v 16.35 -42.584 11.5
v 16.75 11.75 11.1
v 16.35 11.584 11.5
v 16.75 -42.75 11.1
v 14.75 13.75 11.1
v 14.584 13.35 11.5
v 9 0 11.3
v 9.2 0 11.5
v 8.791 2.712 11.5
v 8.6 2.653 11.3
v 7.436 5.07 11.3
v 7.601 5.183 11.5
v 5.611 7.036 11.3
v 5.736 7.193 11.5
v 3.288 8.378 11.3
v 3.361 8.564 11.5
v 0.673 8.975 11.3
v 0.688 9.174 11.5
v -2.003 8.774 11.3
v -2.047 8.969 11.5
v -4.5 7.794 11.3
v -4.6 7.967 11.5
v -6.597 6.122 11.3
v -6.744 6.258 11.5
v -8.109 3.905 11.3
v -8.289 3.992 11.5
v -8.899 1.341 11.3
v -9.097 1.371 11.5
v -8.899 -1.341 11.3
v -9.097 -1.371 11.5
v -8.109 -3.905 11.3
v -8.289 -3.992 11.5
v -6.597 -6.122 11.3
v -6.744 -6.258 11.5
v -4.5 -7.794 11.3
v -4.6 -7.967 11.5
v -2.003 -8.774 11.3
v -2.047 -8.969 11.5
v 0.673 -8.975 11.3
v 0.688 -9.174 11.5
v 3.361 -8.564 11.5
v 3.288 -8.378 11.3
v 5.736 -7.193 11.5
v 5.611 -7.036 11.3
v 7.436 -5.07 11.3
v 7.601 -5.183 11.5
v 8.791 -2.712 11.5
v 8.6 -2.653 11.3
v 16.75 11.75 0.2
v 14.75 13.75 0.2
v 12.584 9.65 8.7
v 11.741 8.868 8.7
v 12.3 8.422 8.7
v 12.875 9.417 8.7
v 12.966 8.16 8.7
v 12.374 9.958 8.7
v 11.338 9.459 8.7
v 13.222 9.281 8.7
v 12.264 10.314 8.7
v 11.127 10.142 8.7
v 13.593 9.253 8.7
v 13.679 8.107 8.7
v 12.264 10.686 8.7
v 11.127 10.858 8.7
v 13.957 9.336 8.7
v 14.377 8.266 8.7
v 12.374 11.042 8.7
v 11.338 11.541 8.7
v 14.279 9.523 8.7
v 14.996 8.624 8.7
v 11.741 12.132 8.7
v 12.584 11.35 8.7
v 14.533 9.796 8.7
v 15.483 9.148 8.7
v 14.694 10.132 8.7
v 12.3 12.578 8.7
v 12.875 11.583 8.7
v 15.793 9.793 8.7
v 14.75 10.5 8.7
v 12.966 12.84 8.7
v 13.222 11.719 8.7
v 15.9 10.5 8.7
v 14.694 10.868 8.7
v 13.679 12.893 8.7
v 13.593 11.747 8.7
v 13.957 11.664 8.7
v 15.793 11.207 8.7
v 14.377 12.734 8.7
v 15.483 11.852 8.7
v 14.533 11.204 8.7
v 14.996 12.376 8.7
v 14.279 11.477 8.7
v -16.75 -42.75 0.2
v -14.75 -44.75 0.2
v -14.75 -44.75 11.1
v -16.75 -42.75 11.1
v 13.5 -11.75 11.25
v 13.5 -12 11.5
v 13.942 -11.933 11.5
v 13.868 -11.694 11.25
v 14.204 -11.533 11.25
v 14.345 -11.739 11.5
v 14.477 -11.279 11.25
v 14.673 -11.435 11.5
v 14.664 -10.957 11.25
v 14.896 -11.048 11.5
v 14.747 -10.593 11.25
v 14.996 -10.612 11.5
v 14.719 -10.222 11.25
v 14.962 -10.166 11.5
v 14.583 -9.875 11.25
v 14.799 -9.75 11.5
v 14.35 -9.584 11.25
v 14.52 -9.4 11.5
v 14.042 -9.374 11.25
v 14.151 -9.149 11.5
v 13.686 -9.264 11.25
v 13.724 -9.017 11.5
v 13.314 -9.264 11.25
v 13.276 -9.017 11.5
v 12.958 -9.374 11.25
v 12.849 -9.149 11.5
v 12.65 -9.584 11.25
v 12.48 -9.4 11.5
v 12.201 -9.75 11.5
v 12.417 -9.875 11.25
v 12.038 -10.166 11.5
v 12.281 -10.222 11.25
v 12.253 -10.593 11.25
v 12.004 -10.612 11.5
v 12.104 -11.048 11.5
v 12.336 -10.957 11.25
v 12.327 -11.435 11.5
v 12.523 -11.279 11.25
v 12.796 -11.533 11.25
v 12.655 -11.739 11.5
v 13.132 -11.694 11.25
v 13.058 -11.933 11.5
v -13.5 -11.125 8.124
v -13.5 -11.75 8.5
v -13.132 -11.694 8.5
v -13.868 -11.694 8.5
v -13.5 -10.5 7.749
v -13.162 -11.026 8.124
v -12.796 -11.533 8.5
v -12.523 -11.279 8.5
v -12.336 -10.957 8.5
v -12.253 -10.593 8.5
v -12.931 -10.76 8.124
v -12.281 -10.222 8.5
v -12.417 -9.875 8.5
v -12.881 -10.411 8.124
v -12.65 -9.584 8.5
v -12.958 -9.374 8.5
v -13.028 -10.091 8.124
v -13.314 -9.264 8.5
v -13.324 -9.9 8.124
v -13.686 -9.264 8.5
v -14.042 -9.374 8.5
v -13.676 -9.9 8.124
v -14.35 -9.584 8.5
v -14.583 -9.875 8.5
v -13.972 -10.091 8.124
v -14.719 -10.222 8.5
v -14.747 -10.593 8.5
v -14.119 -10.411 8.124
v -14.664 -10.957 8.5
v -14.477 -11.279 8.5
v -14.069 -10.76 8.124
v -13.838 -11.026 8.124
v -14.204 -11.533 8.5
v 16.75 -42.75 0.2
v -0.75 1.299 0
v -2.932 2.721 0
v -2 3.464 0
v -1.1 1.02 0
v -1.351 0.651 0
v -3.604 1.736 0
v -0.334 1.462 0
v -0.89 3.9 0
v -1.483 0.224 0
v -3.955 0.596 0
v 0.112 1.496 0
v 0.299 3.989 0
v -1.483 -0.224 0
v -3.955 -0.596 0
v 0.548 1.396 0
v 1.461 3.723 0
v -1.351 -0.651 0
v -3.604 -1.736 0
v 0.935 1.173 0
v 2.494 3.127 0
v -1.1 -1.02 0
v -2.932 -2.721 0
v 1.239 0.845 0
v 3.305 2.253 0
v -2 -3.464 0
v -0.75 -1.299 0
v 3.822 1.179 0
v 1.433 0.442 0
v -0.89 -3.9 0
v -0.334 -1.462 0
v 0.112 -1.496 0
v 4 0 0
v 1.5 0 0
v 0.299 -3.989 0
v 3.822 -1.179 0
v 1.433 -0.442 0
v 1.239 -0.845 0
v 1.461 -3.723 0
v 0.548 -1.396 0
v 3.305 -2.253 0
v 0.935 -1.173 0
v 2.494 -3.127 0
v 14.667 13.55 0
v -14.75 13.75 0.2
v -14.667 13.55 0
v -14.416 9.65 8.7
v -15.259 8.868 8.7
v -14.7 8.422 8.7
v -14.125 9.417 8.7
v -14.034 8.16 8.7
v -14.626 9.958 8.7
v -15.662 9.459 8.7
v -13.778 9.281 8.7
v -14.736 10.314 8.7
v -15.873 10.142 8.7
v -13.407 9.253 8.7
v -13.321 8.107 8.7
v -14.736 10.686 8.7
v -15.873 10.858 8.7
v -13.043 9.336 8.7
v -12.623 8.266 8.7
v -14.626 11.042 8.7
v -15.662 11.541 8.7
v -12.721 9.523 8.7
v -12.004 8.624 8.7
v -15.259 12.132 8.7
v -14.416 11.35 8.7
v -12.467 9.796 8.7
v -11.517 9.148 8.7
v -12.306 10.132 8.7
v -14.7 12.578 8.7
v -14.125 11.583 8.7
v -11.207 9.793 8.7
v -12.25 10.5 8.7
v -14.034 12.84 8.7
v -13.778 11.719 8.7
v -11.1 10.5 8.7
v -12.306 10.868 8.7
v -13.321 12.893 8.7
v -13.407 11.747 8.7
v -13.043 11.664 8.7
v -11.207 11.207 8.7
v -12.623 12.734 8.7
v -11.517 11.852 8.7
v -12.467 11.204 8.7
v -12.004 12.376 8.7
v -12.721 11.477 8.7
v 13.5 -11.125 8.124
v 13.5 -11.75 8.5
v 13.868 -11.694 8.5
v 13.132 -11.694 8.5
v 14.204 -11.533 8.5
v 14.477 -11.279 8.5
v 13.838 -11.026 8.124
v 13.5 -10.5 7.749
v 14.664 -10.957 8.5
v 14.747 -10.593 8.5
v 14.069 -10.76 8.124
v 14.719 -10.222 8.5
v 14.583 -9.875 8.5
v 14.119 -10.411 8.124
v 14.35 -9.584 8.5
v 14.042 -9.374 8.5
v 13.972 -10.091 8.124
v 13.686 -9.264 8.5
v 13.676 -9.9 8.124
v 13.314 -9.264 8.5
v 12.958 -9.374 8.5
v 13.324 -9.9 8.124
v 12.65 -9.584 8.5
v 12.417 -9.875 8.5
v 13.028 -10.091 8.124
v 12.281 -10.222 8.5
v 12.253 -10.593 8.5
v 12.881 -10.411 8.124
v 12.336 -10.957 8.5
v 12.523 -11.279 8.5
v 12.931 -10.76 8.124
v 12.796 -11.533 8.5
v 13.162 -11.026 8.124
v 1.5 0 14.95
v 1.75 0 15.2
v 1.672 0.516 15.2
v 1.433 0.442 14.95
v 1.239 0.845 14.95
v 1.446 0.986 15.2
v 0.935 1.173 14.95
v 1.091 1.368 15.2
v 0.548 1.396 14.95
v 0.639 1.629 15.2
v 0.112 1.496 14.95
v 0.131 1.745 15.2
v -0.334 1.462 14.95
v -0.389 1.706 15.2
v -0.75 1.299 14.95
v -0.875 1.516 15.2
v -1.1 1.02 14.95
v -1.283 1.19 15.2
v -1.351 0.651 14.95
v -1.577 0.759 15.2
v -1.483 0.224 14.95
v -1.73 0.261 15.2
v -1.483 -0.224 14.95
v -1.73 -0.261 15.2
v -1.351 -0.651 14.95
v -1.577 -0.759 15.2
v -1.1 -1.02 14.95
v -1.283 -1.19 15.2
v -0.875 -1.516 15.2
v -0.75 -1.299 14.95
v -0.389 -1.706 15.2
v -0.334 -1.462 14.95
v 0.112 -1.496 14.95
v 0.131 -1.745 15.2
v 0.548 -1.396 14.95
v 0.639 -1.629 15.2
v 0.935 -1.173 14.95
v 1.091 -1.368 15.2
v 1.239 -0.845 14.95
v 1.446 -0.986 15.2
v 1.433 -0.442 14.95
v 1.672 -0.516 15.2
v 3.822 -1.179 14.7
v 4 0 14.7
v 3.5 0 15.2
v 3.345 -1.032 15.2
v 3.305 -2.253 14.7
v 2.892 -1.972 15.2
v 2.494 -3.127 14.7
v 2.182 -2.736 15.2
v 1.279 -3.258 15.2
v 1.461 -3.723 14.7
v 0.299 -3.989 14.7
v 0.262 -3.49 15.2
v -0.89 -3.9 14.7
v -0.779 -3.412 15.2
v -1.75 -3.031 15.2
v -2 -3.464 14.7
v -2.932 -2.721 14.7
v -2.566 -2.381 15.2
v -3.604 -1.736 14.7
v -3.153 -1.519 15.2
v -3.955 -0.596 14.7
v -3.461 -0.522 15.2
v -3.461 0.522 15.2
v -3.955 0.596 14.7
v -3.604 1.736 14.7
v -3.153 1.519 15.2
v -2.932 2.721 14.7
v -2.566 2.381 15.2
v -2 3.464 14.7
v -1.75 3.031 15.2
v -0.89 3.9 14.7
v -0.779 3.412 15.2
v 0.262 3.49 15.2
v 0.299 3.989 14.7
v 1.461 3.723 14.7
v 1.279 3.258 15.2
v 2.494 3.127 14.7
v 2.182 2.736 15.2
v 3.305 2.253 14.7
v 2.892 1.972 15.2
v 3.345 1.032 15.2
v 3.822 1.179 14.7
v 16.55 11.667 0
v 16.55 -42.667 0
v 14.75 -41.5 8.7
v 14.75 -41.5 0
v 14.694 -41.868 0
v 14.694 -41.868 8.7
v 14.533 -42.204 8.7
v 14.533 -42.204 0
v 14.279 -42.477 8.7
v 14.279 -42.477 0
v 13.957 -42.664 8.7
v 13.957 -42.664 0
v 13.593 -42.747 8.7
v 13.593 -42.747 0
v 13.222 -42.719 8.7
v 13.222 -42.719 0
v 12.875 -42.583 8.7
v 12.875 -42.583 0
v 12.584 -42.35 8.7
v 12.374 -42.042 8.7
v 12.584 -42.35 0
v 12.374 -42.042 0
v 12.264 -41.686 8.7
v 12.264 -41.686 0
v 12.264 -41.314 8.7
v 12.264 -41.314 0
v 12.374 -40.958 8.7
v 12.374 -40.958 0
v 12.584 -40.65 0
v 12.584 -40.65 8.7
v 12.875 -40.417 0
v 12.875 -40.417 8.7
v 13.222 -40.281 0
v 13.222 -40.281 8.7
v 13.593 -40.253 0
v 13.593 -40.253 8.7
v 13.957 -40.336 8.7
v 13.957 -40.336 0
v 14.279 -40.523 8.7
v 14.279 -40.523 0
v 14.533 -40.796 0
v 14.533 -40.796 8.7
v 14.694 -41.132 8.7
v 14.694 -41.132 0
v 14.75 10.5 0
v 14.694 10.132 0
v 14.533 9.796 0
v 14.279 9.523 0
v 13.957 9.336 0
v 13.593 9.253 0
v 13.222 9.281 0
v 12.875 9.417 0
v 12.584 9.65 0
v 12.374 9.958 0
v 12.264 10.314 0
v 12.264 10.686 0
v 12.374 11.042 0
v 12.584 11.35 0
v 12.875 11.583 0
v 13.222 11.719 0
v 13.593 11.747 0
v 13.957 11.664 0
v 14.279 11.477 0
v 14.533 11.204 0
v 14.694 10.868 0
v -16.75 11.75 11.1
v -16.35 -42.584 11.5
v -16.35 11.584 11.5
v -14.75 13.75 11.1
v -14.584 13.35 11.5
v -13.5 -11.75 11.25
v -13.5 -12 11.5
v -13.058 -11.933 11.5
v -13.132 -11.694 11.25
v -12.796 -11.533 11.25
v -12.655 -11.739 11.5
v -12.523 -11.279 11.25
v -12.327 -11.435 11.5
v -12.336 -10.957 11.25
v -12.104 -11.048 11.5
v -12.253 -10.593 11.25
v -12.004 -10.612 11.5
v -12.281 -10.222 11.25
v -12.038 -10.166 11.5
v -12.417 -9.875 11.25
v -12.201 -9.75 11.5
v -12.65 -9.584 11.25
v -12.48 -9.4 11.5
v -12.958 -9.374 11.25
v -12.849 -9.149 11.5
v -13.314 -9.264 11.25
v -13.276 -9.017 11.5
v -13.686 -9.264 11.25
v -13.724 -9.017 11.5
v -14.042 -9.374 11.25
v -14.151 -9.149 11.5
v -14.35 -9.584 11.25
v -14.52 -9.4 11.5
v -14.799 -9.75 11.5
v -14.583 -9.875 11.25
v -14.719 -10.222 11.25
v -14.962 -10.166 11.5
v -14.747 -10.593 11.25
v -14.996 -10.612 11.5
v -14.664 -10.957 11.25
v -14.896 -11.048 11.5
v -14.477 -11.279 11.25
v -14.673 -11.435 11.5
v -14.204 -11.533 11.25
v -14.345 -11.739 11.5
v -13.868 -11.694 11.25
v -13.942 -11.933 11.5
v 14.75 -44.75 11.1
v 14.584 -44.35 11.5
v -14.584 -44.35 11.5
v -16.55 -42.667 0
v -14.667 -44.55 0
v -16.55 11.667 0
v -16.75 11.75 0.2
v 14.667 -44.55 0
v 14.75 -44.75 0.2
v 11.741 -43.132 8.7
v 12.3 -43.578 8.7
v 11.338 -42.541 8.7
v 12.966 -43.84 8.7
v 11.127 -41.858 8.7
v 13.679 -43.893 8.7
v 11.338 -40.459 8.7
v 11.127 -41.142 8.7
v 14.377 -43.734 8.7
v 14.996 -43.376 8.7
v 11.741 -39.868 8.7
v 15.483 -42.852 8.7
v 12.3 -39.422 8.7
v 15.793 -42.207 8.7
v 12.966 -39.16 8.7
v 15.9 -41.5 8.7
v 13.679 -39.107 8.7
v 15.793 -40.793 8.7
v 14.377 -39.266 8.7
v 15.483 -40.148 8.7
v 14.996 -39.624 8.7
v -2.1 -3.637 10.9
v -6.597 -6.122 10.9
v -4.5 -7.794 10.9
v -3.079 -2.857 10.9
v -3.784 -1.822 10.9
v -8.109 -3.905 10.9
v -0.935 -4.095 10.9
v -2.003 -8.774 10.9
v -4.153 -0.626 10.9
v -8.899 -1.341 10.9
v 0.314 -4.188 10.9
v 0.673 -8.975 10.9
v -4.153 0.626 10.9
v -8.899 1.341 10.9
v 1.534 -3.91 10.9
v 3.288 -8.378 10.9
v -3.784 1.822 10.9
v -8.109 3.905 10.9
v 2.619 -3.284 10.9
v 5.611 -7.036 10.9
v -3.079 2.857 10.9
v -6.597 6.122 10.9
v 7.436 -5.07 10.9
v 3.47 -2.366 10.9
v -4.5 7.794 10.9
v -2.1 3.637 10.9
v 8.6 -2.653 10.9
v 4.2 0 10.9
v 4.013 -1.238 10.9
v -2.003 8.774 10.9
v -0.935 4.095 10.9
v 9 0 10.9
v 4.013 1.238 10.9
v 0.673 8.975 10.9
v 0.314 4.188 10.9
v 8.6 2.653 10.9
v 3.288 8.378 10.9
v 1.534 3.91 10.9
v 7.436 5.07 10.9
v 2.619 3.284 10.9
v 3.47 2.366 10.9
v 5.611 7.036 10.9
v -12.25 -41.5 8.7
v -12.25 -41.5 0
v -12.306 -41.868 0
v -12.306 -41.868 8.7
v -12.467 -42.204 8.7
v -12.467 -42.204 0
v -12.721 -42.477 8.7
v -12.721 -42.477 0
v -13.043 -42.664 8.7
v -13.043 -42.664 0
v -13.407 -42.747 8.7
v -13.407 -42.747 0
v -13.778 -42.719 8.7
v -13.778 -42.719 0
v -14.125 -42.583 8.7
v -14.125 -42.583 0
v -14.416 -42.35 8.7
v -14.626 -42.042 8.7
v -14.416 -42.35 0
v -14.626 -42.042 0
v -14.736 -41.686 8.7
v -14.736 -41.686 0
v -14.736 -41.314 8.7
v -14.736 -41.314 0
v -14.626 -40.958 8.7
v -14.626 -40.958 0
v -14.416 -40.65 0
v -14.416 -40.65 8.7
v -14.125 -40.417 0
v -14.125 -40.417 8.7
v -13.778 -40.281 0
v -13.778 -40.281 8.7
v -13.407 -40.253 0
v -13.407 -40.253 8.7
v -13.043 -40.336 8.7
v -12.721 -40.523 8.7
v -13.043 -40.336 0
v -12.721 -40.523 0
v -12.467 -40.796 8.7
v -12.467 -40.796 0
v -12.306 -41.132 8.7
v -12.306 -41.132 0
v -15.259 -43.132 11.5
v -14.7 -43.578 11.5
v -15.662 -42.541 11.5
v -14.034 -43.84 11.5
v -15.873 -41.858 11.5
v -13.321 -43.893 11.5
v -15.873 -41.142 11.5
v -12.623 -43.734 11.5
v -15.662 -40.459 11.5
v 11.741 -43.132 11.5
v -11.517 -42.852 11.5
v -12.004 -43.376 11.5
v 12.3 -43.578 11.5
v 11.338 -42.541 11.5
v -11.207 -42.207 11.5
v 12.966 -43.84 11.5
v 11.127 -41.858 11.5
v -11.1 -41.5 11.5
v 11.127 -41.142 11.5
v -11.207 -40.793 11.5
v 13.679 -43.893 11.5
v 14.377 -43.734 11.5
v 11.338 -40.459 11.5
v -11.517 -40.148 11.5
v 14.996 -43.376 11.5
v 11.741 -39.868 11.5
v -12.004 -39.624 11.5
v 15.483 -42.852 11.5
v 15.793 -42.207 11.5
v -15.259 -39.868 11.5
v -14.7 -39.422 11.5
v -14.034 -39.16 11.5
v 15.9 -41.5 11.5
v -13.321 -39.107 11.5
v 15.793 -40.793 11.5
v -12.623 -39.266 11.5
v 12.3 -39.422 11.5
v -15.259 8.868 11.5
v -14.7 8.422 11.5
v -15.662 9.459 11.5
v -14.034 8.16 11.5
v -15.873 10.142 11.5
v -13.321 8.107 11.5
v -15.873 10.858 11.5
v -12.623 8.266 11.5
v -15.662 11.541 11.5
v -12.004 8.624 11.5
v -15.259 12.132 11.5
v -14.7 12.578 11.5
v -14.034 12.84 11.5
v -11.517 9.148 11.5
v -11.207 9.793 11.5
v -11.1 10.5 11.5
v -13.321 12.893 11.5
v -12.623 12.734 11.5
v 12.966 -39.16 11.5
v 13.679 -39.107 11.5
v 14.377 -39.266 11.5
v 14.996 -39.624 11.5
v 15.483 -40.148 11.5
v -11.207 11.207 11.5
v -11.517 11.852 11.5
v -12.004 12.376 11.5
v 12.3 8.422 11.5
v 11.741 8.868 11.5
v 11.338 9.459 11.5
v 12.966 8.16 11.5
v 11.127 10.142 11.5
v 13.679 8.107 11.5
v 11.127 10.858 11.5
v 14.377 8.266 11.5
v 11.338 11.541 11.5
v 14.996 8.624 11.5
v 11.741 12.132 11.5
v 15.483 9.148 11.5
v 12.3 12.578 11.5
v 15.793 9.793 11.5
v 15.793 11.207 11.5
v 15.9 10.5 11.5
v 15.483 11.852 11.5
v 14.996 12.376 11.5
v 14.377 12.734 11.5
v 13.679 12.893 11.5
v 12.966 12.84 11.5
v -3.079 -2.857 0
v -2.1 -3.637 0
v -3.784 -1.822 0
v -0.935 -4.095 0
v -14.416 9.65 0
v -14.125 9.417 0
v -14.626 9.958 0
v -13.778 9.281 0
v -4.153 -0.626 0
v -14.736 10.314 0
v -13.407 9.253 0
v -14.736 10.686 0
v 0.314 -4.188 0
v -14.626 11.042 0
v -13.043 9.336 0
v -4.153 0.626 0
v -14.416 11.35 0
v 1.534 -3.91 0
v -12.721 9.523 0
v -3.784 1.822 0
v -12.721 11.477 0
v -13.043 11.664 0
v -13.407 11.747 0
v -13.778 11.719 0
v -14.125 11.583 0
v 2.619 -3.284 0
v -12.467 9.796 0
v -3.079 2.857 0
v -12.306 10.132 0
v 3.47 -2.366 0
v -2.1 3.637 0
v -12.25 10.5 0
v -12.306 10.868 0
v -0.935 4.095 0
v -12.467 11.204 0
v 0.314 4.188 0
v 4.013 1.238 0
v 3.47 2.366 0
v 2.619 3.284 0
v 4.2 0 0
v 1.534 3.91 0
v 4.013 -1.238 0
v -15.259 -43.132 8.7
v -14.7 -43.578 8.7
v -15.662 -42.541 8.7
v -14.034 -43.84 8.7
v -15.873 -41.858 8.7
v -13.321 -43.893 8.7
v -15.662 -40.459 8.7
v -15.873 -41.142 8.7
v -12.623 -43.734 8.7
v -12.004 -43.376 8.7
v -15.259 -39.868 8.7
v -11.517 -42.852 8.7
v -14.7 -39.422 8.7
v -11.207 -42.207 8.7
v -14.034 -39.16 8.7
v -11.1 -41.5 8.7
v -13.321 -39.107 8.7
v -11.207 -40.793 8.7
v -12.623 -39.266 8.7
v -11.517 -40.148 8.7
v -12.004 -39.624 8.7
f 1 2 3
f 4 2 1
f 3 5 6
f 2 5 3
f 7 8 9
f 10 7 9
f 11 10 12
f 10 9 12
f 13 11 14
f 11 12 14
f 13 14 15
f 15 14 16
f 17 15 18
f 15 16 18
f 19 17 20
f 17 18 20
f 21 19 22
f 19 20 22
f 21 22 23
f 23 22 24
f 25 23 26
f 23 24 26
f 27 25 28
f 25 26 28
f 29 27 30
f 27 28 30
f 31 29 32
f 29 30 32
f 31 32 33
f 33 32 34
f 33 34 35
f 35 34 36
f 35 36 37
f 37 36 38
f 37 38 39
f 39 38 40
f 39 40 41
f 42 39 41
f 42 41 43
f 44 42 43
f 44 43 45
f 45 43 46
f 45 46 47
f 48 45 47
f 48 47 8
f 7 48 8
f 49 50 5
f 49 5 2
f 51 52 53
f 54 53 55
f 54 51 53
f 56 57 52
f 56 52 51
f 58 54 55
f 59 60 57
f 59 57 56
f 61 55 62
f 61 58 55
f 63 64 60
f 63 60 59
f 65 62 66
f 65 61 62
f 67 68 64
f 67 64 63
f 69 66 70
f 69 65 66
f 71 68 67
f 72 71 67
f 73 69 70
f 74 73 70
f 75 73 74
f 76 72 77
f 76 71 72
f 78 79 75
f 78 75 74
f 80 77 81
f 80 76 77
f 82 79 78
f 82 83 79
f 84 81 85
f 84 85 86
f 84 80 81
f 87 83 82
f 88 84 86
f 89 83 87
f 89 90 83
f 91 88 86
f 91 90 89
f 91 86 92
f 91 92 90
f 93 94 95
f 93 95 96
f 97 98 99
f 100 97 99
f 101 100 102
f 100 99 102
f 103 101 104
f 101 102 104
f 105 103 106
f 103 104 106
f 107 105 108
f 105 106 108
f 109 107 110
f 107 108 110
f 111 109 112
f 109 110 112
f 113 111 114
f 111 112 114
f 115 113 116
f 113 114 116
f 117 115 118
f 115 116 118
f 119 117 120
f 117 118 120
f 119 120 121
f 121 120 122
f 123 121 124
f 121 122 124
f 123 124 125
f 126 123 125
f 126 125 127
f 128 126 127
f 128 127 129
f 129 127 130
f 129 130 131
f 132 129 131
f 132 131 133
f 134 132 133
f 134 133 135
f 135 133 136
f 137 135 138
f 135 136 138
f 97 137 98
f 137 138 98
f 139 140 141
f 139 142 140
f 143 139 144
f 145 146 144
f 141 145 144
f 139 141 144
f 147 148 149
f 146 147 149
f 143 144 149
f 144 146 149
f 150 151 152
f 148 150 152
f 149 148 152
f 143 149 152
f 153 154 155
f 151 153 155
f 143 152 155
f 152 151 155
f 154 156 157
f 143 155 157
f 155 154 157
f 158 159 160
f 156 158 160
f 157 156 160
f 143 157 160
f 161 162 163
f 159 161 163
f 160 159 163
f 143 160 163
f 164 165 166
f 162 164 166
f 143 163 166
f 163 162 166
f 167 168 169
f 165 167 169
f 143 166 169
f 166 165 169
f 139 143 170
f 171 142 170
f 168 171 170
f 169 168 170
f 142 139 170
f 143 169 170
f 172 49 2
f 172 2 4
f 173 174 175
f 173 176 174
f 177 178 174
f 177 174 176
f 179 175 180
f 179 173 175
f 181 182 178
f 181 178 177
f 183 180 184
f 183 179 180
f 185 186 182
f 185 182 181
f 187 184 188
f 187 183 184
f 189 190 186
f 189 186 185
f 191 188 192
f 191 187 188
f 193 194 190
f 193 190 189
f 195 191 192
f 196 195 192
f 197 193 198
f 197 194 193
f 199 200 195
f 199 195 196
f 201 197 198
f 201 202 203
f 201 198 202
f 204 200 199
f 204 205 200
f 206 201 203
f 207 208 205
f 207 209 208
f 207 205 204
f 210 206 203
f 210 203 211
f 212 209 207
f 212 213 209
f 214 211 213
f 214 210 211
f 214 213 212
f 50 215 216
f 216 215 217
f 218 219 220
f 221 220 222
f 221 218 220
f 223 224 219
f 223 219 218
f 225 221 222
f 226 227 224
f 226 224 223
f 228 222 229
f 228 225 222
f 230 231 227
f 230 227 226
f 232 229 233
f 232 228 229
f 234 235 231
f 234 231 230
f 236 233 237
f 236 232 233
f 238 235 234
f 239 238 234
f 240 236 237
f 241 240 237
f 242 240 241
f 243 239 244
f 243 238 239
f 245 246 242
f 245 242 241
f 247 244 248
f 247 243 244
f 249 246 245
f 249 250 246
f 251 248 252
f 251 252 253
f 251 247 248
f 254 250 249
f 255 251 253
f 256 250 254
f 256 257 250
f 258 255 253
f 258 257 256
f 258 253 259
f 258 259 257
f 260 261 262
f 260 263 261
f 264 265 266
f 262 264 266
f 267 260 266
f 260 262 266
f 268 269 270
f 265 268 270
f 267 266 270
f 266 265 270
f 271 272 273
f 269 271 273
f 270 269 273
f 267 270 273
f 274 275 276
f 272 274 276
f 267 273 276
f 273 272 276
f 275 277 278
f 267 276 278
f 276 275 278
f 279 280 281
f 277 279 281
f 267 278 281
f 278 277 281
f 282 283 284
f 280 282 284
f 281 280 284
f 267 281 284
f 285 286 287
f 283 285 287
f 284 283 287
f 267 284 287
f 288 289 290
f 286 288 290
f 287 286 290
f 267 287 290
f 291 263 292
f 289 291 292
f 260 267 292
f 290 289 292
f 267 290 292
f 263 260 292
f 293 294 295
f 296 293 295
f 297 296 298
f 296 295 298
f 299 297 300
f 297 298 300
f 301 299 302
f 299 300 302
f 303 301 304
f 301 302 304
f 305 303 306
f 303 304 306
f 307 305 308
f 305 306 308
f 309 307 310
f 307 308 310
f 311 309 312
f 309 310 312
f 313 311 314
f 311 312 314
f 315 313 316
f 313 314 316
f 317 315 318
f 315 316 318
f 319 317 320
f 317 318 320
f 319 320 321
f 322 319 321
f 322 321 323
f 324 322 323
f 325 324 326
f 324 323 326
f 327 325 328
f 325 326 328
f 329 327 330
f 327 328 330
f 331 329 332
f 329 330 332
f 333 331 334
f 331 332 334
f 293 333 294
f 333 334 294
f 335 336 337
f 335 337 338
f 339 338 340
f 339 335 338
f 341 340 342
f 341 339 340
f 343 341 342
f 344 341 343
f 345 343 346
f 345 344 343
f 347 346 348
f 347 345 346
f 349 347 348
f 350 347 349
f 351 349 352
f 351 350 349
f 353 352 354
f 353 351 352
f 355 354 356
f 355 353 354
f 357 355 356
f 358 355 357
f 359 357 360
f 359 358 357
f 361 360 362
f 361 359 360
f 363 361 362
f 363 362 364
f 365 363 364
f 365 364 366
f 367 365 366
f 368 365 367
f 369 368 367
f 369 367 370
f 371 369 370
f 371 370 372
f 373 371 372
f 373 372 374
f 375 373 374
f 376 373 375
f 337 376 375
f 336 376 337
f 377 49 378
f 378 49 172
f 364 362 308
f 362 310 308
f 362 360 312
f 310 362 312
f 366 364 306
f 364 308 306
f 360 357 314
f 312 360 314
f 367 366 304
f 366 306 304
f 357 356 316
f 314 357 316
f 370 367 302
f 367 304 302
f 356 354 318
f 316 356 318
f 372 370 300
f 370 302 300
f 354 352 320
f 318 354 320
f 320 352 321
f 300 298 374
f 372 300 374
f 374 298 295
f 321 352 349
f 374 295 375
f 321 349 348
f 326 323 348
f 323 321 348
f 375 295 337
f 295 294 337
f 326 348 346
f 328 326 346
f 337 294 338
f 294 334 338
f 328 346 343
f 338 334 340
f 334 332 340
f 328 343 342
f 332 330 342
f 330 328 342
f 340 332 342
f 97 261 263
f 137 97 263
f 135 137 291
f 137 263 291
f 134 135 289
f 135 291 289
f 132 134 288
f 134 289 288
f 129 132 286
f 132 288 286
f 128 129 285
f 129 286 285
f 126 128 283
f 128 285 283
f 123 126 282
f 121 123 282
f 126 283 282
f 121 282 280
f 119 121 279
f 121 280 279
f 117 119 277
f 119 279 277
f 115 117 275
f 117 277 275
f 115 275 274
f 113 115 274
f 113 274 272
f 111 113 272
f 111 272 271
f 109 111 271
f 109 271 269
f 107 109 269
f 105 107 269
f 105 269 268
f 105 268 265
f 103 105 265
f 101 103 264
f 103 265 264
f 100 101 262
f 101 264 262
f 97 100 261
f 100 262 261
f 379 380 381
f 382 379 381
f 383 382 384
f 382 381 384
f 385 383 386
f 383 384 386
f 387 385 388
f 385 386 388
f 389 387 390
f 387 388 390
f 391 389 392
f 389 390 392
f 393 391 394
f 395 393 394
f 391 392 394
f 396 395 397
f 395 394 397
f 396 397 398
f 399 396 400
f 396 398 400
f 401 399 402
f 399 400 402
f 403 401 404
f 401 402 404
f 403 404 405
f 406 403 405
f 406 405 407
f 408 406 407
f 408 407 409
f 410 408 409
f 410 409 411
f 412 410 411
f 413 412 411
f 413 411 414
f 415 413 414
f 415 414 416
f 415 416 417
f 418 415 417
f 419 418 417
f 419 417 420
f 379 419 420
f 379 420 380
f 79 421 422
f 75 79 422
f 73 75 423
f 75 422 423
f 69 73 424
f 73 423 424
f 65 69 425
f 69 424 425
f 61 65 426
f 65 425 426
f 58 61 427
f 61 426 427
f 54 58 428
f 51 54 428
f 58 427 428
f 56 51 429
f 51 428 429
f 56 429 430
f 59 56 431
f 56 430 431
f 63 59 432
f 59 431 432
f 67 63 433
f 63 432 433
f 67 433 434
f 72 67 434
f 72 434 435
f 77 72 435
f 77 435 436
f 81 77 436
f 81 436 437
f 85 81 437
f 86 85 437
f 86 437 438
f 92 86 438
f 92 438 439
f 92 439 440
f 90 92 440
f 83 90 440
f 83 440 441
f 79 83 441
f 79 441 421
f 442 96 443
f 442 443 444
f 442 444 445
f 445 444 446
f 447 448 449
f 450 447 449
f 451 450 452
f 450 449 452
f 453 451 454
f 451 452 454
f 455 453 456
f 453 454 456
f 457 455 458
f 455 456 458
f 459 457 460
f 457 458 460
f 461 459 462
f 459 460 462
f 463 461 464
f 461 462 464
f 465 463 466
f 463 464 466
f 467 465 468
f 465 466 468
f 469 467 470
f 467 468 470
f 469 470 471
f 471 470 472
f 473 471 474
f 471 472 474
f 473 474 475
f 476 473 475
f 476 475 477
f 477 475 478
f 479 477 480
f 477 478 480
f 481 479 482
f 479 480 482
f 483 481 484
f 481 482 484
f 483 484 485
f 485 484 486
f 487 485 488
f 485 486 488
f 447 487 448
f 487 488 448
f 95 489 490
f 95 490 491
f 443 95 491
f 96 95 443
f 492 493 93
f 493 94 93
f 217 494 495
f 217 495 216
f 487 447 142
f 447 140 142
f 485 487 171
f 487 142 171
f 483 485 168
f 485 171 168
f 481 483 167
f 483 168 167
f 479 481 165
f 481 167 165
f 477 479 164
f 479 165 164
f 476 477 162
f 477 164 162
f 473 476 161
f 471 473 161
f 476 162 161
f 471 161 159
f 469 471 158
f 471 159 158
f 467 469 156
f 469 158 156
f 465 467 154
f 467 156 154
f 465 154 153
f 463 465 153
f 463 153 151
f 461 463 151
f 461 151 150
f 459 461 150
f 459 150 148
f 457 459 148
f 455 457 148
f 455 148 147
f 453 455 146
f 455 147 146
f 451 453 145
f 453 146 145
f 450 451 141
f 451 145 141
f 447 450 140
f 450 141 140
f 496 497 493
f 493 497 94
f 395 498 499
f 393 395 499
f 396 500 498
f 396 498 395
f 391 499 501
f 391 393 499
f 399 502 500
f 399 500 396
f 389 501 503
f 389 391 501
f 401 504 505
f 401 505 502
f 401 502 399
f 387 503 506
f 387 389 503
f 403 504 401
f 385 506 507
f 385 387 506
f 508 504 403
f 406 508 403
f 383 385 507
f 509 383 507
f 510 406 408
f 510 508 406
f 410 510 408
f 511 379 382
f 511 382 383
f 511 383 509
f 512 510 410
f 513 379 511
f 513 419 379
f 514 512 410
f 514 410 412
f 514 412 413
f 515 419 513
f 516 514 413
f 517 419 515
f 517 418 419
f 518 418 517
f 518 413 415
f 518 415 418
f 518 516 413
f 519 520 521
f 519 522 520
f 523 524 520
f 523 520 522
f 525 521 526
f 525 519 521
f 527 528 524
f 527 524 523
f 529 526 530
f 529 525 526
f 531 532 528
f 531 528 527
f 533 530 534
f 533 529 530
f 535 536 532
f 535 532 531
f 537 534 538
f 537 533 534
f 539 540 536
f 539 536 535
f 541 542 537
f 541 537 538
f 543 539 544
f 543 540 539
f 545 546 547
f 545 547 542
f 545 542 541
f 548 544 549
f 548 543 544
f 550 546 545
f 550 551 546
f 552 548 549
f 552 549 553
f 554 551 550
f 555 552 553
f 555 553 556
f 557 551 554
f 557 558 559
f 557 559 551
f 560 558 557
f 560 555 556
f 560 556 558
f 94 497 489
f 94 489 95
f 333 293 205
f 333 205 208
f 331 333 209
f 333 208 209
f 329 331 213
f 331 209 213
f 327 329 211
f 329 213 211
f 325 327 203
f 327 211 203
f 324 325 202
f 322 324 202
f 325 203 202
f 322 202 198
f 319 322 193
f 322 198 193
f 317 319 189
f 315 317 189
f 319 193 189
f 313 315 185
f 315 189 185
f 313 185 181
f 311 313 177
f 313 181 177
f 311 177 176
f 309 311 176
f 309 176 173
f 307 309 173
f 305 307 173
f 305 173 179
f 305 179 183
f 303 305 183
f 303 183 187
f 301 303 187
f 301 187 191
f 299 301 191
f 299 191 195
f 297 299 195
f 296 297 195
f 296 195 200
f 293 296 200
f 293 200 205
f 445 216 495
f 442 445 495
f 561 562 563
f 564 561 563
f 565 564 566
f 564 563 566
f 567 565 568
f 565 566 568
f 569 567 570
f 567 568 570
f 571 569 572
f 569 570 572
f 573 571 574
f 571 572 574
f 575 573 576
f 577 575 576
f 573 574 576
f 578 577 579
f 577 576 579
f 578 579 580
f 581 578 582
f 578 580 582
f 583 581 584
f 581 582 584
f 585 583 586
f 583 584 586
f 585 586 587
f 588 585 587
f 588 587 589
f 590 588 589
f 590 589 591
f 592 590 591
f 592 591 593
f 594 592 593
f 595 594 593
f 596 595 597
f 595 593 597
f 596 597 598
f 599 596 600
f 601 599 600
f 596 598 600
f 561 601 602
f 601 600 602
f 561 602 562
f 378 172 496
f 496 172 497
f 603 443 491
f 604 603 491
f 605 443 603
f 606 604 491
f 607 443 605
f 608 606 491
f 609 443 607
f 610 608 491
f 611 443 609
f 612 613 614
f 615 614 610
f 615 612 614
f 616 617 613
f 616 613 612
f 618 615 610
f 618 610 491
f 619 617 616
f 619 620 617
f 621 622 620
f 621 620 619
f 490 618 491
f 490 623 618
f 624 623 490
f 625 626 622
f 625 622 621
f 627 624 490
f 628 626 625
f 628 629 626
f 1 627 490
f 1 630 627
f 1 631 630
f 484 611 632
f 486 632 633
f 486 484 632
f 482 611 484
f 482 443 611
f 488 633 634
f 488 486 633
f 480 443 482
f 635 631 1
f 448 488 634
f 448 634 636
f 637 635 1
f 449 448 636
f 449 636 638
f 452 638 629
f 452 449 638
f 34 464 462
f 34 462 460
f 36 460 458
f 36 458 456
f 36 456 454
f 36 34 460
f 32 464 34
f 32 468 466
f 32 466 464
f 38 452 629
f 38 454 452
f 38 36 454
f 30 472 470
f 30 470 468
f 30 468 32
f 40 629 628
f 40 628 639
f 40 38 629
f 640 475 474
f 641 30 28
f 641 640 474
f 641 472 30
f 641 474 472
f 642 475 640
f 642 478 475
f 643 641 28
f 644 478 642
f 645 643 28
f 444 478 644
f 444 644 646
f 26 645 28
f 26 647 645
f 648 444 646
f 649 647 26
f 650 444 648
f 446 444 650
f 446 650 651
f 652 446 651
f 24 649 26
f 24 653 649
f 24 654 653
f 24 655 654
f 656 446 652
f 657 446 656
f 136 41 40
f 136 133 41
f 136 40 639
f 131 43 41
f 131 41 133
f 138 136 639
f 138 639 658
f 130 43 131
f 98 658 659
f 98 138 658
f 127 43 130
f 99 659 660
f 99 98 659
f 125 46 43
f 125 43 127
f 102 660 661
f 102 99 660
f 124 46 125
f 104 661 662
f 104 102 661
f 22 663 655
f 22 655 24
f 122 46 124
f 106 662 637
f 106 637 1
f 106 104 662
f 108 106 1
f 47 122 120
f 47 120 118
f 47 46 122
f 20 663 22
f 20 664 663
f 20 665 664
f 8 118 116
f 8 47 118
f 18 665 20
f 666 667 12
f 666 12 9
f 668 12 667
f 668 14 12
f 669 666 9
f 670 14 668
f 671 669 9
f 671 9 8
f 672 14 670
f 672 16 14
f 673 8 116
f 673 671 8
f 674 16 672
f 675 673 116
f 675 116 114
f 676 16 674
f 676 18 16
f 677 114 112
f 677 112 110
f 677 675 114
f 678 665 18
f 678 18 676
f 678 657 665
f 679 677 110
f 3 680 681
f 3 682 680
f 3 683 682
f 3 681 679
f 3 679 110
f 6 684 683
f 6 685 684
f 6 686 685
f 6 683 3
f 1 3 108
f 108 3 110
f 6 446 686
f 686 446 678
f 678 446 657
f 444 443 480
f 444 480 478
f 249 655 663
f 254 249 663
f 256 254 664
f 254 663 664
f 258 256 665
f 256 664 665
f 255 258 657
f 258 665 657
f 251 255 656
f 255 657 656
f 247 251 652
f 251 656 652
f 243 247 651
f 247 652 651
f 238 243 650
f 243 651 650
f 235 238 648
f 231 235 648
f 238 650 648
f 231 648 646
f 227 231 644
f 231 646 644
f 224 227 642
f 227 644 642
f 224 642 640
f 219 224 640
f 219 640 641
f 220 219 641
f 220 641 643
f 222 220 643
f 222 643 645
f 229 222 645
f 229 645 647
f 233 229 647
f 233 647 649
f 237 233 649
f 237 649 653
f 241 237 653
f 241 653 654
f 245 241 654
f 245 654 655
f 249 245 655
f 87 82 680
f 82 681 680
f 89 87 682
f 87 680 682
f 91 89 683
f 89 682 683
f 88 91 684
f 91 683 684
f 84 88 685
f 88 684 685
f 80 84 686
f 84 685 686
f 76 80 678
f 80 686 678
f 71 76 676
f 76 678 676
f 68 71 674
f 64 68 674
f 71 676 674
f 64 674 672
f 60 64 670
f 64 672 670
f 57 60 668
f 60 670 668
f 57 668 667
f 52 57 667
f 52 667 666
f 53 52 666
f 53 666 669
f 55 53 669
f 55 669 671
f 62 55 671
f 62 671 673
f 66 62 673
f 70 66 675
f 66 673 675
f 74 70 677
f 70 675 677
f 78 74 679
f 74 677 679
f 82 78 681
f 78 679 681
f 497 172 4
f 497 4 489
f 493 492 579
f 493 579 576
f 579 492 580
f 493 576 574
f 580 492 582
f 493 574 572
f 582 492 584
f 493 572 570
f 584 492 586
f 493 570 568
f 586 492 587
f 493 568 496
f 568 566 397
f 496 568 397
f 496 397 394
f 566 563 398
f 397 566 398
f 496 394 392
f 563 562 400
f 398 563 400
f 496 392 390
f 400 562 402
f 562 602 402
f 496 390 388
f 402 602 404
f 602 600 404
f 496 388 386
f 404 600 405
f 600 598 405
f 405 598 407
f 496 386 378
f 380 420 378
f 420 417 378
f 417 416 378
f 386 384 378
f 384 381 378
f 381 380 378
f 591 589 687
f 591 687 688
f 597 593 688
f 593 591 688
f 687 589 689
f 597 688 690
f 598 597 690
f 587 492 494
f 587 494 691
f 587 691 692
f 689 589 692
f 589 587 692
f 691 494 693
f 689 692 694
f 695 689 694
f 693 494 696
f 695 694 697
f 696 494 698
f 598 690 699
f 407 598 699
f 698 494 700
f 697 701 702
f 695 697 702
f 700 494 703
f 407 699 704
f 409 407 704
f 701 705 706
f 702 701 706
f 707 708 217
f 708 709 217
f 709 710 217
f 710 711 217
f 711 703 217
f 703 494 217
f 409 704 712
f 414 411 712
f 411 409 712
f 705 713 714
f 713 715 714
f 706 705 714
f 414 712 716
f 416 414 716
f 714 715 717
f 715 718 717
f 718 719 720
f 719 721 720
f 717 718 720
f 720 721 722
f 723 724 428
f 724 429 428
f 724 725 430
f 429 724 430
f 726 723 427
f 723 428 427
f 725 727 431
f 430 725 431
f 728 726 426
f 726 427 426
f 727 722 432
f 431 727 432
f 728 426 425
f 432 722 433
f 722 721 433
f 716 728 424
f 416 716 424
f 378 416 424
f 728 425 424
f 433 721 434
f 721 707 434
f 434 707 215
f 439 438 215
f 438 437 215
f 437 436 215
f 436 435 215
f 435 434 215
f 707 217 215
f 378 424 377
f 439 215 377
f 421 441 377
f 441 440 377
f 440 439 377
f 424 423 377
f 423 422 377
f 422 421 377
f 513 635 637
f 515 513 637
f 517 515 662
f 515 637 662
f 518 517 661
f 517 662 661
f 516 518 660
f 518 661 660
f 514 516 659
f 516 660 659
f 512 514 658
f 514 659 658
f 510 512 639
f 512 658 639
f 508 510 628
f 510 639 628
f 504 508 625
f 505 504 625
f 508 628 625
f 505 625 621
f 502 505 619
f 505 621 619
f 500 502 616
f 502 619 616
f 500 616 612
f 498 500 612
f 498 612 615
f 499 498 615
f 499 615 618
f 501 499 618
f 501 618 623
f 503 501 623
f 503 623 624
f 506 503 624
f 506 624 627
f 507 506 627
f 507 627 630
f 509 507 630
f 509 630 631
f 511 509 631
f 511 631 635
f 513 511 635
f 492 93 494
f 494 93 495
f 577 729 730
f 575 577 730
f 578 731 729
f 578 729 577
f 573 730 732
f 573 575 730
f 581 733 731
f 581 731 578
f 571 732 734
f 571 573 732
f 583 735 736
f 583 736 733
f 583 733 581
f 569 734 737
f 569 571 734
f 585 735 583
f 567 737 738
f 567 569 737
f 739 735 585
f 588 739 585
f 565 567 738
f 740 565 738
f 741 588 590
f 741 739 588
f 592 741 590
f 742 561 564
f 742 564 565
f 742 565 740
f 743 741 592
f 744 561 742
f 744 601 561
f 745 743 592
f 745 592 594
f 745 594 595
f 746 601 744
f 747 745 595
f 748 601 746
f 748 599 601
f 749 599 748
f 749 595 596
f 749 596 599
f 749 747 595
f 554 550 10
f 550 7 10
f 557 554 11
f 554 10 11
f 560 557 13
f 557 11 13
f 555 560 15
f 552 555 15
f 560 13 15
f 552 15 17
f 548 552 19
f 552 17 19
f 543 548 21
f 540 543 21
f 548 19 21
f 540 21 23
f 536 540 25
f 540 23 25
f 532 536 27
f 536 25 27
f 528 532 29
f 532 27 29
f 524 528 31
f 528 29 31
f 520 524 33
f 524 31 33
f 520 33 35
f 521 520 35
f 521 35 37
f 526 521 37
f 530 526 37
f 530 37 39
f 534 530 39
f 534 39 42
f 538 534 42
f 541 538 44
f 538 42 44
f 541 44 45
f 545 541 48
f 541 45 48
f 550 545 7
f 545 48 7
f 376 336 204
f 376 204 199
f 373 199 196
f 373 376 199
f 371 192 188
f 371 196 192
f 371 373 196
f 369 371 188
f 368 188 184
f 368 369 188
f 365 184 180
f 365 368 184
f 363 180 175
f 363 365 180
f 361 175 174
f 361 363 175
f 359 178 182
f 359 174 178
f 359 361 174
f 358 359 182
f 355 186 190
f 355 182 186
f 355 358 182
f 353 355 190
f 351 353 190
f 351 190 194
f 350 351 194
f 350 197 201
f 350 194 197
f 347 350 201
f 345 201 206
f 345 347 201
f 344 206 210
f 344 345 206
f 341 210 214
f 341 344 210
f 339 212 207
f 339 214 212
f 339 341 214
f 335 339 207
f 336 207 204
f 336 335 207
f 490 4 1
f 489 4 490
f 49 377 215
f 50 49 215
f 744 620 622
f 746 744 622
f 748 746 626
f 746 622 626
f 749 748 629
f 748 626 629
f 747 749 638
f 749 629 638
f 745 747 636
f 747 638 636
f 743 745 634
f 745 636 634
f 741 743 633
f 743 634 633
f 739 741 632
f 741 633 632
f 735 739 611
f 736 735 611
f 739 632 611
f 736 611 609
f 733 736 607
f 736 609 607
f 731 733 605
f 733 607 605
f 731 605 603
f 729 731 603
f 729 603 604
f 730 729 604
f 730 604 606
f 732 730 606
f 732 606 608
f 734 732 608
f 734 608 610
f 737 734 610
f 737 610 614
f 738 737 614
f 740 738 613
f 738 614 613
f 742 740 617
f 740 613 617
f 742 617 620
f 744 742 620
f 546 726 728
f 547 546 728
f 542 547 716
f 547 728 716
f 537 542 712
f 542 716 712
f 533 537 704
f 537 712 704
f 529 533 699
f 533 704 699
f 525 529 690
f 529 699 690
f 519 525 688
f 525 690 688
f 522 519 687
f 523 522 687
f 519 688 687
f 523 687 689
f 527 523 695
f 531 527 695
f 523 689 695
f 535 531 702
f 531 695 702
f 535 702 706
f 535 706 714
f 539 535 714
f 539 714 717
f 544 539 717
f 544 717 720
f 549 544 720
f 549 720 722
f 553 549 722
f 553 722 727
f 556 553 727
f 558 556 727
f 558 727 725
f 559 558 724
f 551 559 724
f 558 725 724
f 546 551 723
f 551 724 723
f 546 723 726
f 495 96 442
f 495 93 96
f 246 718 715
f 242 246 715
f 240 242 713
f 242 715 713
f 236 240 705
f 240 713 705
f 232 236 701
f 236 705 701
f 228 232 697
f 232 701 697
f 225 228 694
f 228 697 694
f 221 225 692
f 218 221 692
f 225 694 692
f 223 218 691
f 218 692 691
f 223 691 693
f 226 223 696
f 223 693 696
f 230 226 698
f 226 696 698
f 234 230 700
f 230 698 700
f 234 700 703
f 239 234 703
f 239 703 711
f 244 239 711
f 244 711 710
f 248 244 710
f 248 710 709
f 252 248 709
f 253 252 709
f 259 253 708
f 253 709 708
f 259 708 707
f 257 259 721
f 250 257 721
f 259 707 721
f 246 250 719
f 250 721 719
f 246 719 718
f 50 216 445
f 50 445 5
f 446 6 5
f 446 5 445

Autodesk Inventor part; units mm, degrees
ref_plane "YZ Plane" through (0, 0, 0) normal (1, 0, 0) x (0, 1, 0)
ref_plane "XZ Plane" through (0, 0, 0) normal (0, 1, 0) x (-1, 0, 0)
ref_plane "XY Plane" through (0, 0, 0) normal (0, 0, 1) x (1, 0, 0)
sketch "スケッチ1" plane through (0, 0, 0) normal (0, 0, 1) x (1, 0, 0)
  line L0 (-14.75, 13.75) -> (14.75, 13.75)
  line L1 (16.75, 11.75) -> (16.75, -42.75)
  line L2 (14.75, -44.75) -> (-14.75, -44.75)
  line L3 (-16.75, -42.75) -> (-16.75, 11.75)
  line L4 (-14.75, 13.75) -> (-16.75, 11.75)
  line L5 (14.75, 13.75) -> (16.75, 11.75)
  line L6 (16.75, -42.75) -> (14.75, -44.75)
  line L7 (-14.75, -44.75) -> (-16.75, -42.75)
  line L8 (0, 0) -> (0, -49.9081) construction
  circle A0 centre (0, 0) radius 13 construction
  line L9 (-13.5, 10.5) -> (13.5, 10.5) construction
  line L10 (13.5, 10.5) -> (13.5, -41.5) construction
  line L11 (13.5, -41.5) -> (-13.5, -41.5) construction
  line L12 (-13.5, -41.5) -> (-13.5, 10.5) construction
  circle A1 centre (-13.5, 10.5) radius 1.25
  circle A2 centre (13.5, 10.5) radius 1.25
  circle A3 centre (13.5, -41.5) radius 1.25
  circle A4 centre (-13.5, -41.5) radius 1.25
  circle A5 centre (0, 0) radius 4.2
  point P0 (-16.75, 13.75)
  point P1 (16.75, -44.75)
  point P2 (16.75, 13.75)
  point P3 (-16.75, -44.75)
  dimension "d0" = 2
  dimension "d1" = 2
  dimension "d2" = 2
  dimension "d3" = 2
  dimension "d4" = 2
  dimension "d5" = 2
  dimension "d6" = 2
  dimension "d7" = 2
  dimension "d8" = 33.5
  dimension "d9" = 26
  dimension "d10" = 13.75
  dimension "d11" = 58.5
  dimension "d24" = 27
  dimension "d25" = 10.5
  dimension "d26" = 52
  dimension "d27" = 2.5
  dimension "d31" = 8.4
extrude "押し出し1" add sketch "スケッチ1" along normal blind 11.5
sketch "スケッチ6" plane through (0, 0, 11.5) normal (0, 0, 1) x (1, 0, 0)
  line L0 (0, 0) -> (-21.0529, 0) construction
  line L1 (0, 0) -> (0, -16.0256) construction
  circle A0 centre (-13.5, 10.5) radius 1.25 construction
  line L2 (-13.5, 10.5) -> (-13.5, -10.5) construction
  point P0 (13.5, -10.5)
  dimension "d48" = 21
hole "穴1" at (13.5, -10.5, 11.5) at (-13.5, -10.5, 11.5) direction (0, 0, -1) diameter 2.5 depth 3 tip angle 118 countersink diameter 3 countersink angle 90
sketch "スケッチ2" plane through (0, 0, 11.5) normal (0, 0, 1) x (1, 0, 0)
  line L0 (-13.5, 10.5) -> (13.5, 10.5) construction
  line L1 (13.5, 10.5) -> (13.5, -41.5) construction
  line L2 (13.5, -41.5) -> (-13.5, -41.5) construction
  line L3 (-13.5, -41.5) -> (-13.5, 10.5) construction
  line L4 (0, 0) -> (0, 31.2445) construction
  circle A0 centre (13.5, 10.5) radius 2.4
  circle A1 centre (13.5, -41.5) radius 2.4
  circle A2 centre (-13.5, -41.5) radius 2.4
  circle A3 centre (-13.5, 10.5) radius 2.4
  dimension "d18" = 27
  dimension "d19" = 10.5
  dimension "d20" = 52
  dimension "d21" = 4.8
extrude "押し出し2" cut sketch "スケッチ2" against normal blind 2.8
sketch "スケッチ3" plane through (0, 0, 11.5) normal (0, 0, 1) x (1, 0, 0)
  circle A0 centre (0, 0) radius 9
  dimension "d28" = 18
extrude "押し出し3" cut sketch "スケッチ3" against normal blind 0.6
chamfer "面取り1" distance 0.2 angle 45 9 edges at (-9, 0, 11.5) (-15.75, -43.75, 0) (-16.75, -15.5, 0) (0, -44.75, 0) (15.75, -43.75, 0) (16.75, -15.5, 0) (15.75, 12.75, 0) (0, 13.75, 0) (-15.75, 12.75, 0)
chamfer "面取り2" distance 0.4 angle 45 8 edges at (-16.75, -15.5, 11.5) (-15.75, 12.75, 11.5) (0, 13.75, 11.5) (15.75, 12.75, 11.5) (16.75, -15.5, 11.5) (15.75, -43.75, 11.5) (0, -44.75, 11.5) (-15.75, -43.75, 11.5)
sketch "スケッチ4" plane through (0, 0, 0) normal (0, 1, 0) x (-1, 0, 0)
  line L0 (0, 0) -> (-1.5, 0) construction
  line L1 (-4, 0) -> (-4, 14.7)
  line L2 (-3.5, 15.2) -> (-1.75, 15.2)
  line L3 (0, 15.2) -> (0, 0) construction
  line L4 (-4, 14.7) -> (-3.5, 15.2)
  line L5 (-14.75, 11.5) -> (14.75, 11.5) construction
  line L6 (-1.5, 14.95) -> (-1.5, 0)
  line L7 (-1.5, 14.95) -> (-1.75, 15.2)
  line L8 (-1.5, 0) -> (-4, 0)
  point P0 (-4, 15.2)
  point P1 (-1.5, 15.2)
  point P2 (-1.5, 15.2)
  dimension "d32" = 0.5
  dimension "d33" = 0.5
  dimension "d34" = 8
  dimension "d35" = 3.7
  dimension "d45" = 3
  dimension "d46" = 0.25
  dimension "d47" = 0.25
revolve "回転1" add sketch "スケッチ4" angle 360 about axis through (0, 0, 15.2) along (0, 0, -1)
equation "\"d1\" = d0"
equation "\"d2\" = d0"
equation "\"d3\" = d2"
equation "\"d4\" = d0"
equation "\"d5\" = d4"
equation "\"d6\" = d0"
equation "\"d7\" = d6"
equation "\"d33\" = d32"
equation "\"d47\" = d46"
properties part number "XM540_HOUSING_TOP"
